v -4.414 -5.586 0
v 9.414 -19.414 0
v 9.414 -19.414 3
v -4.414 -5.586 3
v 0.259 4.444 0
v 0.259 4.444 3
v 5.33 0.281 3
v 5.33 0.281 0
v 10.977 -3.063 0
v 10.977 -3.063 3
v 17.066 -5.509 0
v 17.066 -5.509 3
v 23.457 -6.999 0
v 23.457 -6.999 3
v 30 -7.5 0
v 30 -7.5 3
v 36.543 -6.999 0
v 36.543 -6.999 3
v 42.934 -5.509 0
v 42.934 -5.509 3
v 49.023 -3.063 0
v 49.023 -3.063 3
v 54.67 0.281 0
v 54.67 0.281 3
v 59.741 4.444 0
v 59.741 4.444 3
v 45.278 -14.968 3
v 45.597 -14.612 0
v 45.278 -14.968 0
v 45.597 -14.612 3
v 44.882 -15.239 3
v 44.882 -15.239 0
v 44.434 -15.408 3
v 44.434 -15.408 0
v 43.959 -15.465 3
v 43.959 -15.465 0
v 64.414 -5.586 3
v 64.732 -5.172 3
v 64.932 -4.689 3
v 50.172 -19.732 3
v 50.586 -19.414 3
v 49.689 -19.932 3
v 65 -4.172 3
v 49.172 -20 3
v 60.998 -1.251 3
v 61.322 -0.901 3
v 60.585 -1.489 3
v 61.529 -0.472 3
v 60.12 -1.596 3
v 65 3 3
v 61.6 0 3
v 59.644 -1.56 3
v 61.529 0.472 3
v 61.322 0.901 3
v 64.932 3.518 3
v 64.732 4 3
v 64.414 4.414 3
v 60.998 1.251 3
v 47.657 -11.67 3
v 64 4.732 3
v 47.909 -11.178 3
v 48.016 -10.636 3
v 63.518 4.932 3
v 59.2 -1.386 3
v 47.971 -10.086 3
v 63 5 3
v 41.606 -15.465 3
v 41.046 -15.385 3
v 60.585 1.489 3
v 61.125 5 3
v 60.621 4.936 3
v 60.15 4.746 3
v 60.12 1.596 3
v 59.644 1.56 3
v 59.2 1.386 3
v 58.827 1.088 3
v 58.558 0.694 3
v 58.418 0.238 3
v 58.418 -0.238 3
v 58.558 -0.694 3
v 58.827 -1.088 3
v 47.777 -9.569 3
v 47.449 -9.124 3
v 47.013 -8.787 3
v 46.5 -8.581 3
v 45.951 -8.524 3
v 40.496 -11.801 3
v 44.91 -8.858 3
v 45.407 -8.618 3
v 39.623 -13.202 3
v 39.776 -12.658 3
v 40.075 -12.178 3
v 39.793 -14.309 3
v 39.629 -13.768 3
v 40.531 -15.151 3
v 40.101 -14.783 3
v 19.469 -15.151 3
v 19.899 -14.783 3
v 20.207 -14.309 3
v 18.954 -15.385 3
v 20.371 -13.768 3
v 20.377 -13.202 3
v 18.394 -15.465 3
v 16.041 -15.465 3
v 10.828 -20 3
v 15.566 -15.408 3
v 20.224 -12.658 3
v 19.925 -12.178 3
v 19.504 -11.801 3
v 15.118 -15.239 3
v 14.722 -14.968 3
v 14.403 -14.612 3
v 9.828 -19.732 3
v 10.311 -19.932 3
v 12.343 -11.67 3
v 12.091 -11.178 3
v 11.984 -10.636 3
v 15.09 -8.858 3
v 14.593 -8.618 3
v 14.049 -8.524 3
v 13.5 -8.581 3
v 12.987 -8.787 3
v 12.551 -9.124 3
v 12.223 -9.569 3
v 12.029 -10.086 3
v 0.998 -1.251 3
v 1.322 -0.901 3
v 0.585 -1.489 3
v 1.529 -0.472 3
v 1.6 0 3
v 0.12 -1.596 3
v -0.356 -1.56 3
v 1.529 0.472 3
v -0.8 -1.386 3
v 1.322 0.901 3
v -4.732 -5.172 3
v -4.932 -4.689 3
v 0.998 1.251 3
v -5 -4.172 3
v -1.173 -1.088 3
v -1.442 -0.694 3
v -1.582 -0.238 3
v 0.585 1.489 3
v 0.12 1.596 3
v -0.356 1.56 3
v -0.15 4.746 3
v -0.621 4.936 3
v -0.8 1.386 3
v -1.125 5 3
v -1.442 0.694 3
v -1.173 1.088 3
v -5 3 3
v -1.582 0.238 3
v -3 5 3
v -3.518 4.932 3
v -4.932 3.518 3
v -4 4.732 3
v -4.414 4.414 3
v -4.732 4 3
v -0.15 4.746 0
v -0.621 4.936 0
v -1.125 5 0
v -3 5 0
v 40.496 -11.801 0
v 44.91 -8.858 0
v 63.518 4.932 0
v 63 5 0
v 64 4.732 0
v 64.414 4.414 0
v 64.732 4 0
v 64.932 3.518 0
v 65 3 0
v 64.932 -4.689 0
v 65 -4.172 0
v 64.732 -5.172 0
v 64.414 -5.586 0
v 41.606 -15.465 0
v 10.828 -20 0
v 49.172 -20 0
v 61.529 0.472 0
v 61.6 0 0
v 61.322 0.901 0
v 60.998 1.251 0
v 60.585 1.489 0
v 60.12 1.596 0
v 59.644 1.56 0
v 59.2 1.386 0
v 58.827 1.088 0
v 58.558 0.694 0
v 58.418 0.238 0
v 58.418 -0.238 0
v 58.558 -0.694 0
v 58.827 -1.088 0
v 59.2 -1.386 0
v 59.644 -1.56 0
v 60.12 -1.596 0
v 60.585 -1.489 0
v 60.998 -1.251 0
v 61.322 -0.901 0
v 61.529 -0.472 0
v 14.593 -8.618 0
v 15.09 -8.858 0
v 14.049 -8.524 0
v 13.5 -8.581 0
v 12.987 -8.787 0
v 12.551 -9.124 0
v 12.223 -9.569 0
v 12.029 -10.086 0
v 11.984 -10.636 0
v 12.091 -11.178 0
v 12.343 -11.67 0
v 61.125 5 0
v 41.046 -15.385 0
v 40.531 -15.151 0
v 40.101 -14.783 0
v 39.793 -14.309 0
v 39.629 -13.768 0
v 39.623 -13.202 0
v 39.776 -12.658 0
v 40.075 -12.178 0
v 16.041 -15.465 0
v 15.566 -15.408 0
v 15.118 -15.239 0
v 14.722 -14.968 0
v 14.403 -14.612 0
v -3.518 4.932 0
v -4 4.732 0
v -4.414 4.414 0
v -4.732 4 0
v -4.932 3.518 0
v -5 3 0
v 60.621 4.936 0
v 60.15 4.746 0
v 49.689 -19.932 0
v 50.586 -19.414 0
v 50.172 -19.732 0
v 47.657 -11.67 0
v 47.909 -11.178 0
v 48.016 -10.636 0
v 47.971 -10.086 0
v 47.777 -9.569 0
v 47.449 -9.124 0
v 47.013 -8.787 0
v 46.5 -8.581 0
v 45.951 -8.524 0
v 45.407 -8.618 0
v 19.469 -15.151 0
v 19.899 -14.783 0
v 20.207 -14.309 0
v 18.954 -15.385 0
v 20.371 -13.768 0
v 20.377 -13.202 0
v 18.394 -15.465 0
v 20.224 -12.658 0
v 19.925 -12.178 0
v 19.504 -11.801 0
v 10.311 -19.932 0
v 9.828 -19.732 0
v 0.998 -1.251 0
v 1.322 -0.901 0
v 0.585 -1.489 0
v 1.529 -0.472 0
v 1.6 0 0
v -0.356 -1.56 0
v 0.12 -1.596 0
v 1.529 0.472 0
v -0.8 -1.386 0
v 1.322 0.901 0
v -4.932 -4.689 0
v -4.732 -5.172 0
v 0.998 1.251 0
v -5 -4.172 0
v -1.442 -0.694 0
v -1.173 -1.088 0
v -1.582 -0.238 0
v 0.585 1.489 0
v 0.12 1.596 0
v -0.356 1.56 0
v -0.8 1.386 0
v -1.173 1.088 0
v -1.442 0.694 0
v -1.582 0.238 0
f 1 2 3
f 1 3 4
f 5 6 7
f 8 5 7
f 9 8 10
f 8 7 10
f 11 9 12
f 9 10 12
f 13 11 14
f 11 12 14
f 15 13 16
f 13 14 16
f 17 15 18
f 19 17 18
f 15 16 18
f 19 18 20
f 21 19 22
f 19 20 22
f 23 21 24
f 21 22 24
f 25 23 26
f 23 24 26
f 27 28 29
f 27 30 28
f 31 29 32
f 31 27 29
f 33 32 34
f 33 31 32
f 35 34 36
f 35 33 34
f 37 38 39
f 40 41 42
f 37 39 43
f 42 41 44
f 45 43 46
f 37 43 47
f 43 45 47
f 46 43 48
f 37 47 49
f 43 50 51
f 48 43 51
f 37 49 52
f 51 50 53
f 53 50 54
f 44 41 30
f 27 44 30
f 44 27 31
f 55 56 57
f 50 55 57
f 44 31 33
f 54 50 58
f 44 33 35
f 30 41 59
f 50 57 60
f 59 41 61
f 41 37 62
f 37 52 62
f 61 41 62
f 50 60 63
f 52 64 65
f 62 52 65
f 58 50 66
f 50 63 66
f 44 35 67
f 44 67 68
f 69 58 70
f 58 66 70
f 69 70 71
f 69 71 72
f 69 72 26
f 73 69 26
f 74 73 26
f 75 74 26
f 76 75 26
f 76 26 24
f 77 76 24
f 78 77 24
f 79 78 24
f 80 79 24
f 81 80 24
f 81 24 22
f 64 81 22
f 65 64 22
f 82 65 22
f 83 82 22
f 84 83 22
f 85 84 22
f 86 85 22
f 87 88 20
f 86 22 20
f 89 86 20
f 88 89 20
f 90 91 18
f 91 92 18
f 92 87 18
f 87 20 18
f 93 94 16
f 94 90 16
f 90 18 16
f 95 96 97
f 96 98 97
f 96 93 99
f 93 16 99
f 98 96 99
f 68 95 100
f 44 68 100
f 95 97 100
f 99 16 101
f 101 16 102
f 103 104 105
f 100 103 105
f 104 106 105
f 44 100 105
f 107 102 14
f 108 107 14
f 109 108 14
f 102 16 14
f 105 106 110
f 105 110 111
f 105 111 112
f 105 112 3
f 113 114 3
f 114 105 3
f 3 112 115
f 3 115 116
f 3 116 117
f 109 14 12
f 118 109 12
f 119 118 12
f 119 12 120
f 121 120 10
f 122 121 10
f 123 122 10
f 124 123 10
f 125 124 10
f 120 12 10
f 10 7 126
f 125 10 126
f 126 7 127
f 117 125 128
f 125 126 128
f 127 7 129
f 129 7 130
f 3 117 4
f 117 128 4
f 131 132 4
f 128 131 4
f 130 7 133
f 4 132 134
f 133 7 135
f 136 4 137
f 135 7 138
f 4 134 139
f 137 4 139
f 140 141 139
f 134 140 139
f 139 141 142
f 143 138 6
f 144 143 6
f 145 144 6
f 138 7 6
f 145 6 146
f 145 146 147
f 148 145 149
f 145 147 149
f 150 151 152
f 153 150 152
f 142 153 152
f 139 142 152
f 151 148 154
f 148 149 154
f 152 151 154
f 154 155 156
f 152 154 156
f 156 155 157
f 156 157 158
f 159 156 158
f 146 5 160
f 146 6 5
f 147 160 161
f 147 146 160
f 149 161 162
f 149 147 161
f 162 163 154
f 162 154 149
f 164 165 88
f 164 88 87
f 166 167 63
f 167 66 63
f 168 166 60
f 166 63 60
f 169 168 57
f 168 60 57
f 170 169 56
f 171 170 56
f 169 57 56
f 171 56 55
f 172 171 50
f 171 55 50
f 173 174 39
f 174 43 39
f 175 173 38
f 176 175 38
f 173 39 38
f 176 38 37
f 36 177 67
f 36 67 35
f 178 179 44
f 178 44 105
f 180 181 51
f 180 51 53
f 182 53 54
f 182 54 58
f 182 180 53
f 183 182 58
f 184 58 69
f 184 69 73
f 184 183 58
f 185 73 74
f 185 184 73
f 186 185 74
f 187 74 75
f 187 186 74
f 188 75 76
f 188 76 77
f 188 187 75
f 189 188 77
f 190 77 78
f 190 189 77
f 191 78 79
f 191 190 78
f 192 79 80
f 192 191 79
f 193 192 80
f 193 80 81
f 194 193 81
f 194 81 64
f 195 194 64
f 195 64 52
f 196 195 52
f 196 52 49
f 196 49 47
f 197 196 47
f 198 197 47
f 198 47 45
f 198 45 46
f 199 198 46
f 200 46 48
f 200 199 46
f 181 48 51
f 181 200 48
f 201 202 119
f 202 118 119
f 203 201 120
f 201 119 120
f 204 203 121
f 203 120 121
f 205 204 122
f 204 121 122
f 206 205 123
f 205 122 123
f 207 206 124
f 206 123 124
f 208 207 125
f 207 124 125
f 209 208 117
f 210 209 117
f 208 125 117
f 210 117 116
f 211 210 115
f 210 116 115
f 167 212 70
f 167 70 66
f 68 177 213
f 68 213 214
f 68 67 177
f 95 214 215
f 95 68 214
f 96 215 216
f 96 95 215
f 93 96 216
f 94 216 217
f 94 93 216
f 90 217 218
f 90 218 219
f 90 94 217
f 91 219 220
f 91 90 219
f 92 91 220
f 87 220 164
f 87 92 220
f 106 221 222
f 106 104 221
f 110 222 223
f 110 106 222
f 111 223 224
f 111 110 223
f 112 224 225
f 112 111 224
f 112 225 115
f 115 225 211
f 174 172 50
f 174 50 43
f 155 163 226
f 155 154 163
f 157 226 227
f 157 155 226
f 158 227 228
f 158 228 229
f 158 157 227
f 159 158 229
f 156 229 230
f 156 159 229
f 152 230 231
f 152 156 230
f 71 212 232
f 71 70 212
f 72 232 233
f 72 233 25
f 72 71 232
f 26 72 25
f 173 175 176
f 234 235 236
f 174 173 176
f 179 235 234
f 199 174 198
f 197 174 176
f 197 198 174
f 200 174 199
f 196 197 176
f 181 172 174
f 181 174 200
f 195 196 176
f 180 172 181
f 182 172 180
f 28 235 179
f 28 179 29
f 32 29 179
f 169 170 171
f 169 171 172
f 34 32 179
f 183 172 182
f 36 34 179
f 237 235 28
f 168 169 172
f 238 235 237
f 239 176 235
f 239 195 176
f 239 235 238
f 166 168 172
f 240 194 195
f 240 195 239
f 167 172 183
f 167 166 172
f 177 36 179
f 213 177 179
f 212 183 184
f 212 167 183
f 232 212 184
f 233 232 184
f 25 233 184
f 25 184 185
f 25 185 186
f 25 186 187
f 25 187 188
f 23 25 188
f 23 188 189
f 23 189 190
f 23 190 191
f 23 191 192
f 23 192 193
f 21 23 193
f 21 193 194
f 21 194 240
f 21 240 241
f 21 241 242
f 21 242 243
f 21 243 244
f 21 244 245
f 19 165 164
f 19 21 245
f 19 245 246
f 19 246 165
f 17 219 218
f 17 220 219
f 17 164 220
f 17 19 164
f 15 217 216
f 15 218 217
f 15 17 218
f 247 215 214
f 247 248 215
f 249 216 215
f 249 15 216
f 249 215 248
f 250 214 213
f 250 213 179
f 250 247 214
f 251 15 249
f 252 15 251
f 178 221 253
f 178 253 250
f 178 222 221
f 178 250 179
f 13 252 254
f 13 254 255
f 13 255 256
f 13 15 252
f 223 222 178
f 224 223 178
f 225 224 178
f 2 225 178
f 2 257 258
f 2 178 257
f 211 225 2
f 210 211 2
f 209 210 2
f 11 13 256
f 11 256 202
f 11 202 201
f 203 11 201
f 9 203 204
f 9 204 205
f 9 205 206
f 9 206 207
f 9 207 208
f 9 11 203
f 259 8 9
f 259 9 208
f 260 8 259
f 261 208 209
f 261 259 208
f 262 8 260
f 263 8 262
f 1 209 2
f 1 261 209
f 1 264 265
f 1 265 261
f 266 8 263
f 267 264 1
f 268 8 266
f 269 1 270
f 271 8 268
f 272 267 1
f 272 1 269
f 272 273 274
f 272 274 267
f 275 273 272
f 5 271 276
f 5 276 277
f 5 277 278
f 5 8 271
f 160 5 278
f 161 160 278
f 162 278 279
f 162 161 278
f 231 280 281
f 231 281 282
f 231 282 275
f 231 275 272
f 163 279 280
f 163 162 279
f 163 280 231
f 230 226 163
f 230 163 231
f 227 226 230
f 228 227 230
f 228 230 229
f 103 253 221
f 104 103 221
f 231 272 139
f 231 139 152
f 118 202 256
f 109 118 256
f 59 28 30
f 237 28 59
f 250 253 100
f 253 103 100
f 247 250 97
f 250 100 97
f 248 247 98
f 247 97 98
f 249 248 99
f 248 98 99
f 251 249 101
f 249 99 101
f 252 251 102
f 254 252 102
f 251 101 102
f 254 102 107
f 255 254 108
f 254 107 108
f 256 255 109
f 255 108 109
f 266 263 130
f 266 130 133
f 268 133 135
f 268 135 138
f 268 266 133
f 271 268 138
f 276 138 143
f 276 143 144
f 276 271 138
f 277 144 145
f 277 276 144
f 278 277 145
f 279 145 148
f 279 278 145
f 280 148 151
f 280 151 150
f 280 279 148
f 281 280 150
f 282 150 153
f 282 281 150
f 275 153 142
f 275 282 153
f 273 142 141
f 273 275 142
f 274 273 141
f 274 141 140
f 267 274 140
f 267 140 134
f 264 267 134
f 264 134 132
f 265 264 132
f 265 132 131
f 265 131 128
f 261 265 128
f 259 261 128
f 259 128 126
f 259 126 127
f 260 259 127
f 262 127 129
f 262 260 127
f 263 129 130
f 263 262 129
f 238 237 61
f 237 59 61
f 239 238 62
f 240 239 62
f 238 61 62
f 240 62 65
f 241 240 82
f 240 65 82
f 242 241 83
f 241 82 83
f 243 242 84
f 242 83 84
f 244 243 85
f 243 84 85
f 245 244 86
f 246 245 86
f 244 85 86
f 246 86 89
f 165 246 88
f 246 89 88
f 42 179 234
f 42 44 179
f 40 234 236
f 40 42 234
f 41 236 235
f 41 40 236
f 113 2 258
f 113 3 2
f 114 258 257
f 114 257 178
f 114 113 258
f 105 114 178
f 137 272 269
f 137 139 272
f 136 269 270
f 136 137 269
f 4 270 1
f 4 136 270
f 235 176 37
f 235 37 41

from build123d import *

# Parameters (mm, degrees)
SKETCH_1_R          = 1.6
EXTRUDE_1_DEPTH     = 3
CUT_EXTRUDE_1_DEPTH = 4
SKETCH_4_R          = 43
CUT_EXTRUDE_2_DEPTH = 10
FILLET_1_R          = 2


with BuildPart() as part:
    # 草图1 → 凸台-拉伸1 (new body)
    with BuildSketch(Plane.XY):
        with BuildLine():
            Line((45.024979201, 5), (65, 5))
            Line((65, 5), (65, -5))
            Line((65, -5), (50, -20))
            Line((50, -20), (10, -20))
            Line((10, -20), (-5, -5))
            Line((-5, -5), (-5, 5))
            Line((-5, 5), (14.975020799, 5))
            ThreePointArc((14.975020799, 5), (30, 1.5), (45.024979201, 5))
        make_face()
        with Locations((60, 0)):
            Circle(SKETCH_1_R, mode=Mode.SUBTRACT)
        Circle(SKETCH_1_R, mode=Mode.SUBTRACT)
    extrude(amount=EXTRUDE_1_DEPTH)

    # 草图3 → 切除-拉伸1 (cut, through all)
    with BuildSketch(Plane(origin=(0, 0, 0), x_dir=(-1, 0, 0), z_dir=(0, 0, -1))):
        Polygon((-25, -15.464816242), (-15, -15.464816242), (-6.245134561, -2.961572616), align=None)
        Polygon((-53.754865439, -2.961572616), (-35, -15.464816242), (-45, -15.464816242), align=None)
    extrude(amount=-CUT_EXTRUDE_1_DEPTH, mode=Mode.SUBTRACT)

    # 草图4 → 切除-拉伸2 (cut)
    with BuildSketch(Plane.XY.offset(3)):
        with Locations((30, 35.5)):
            Circle(SKETCH_4_R)
    extrude(amount=-CUT_EXTRUDE_2_DEPTH, mode=Mode.SUBTRACT)

    # 圆角1
    fillet_1_edges = [part.edges().sort_by_distance(p)[0] for p in [
        (50, -20, 1.5),
        (10, -20, 1.5),
        (-5, -5, 1.5),
        (-5, 5, 1.5),
        (65, 5, 1.5),
        (65, -5, 1.5),
        (25, -15.464816242, 1.5),
        (6.245134561, -2.961572616, 1.5),
        (15, -15.464816242, 1.5),
        (45, -15.464816242, 1.5),
        (53.754865439, -2.961572616, 1.5),
        (35, -15.464816242, 1.5),
        (-0.310889132, 5, 1.5),
        (60.310889132, 5, 1.5),
    ]]
    fillet(fillet_1_edges, radius=FILLET_1_R)


solid = part.part
